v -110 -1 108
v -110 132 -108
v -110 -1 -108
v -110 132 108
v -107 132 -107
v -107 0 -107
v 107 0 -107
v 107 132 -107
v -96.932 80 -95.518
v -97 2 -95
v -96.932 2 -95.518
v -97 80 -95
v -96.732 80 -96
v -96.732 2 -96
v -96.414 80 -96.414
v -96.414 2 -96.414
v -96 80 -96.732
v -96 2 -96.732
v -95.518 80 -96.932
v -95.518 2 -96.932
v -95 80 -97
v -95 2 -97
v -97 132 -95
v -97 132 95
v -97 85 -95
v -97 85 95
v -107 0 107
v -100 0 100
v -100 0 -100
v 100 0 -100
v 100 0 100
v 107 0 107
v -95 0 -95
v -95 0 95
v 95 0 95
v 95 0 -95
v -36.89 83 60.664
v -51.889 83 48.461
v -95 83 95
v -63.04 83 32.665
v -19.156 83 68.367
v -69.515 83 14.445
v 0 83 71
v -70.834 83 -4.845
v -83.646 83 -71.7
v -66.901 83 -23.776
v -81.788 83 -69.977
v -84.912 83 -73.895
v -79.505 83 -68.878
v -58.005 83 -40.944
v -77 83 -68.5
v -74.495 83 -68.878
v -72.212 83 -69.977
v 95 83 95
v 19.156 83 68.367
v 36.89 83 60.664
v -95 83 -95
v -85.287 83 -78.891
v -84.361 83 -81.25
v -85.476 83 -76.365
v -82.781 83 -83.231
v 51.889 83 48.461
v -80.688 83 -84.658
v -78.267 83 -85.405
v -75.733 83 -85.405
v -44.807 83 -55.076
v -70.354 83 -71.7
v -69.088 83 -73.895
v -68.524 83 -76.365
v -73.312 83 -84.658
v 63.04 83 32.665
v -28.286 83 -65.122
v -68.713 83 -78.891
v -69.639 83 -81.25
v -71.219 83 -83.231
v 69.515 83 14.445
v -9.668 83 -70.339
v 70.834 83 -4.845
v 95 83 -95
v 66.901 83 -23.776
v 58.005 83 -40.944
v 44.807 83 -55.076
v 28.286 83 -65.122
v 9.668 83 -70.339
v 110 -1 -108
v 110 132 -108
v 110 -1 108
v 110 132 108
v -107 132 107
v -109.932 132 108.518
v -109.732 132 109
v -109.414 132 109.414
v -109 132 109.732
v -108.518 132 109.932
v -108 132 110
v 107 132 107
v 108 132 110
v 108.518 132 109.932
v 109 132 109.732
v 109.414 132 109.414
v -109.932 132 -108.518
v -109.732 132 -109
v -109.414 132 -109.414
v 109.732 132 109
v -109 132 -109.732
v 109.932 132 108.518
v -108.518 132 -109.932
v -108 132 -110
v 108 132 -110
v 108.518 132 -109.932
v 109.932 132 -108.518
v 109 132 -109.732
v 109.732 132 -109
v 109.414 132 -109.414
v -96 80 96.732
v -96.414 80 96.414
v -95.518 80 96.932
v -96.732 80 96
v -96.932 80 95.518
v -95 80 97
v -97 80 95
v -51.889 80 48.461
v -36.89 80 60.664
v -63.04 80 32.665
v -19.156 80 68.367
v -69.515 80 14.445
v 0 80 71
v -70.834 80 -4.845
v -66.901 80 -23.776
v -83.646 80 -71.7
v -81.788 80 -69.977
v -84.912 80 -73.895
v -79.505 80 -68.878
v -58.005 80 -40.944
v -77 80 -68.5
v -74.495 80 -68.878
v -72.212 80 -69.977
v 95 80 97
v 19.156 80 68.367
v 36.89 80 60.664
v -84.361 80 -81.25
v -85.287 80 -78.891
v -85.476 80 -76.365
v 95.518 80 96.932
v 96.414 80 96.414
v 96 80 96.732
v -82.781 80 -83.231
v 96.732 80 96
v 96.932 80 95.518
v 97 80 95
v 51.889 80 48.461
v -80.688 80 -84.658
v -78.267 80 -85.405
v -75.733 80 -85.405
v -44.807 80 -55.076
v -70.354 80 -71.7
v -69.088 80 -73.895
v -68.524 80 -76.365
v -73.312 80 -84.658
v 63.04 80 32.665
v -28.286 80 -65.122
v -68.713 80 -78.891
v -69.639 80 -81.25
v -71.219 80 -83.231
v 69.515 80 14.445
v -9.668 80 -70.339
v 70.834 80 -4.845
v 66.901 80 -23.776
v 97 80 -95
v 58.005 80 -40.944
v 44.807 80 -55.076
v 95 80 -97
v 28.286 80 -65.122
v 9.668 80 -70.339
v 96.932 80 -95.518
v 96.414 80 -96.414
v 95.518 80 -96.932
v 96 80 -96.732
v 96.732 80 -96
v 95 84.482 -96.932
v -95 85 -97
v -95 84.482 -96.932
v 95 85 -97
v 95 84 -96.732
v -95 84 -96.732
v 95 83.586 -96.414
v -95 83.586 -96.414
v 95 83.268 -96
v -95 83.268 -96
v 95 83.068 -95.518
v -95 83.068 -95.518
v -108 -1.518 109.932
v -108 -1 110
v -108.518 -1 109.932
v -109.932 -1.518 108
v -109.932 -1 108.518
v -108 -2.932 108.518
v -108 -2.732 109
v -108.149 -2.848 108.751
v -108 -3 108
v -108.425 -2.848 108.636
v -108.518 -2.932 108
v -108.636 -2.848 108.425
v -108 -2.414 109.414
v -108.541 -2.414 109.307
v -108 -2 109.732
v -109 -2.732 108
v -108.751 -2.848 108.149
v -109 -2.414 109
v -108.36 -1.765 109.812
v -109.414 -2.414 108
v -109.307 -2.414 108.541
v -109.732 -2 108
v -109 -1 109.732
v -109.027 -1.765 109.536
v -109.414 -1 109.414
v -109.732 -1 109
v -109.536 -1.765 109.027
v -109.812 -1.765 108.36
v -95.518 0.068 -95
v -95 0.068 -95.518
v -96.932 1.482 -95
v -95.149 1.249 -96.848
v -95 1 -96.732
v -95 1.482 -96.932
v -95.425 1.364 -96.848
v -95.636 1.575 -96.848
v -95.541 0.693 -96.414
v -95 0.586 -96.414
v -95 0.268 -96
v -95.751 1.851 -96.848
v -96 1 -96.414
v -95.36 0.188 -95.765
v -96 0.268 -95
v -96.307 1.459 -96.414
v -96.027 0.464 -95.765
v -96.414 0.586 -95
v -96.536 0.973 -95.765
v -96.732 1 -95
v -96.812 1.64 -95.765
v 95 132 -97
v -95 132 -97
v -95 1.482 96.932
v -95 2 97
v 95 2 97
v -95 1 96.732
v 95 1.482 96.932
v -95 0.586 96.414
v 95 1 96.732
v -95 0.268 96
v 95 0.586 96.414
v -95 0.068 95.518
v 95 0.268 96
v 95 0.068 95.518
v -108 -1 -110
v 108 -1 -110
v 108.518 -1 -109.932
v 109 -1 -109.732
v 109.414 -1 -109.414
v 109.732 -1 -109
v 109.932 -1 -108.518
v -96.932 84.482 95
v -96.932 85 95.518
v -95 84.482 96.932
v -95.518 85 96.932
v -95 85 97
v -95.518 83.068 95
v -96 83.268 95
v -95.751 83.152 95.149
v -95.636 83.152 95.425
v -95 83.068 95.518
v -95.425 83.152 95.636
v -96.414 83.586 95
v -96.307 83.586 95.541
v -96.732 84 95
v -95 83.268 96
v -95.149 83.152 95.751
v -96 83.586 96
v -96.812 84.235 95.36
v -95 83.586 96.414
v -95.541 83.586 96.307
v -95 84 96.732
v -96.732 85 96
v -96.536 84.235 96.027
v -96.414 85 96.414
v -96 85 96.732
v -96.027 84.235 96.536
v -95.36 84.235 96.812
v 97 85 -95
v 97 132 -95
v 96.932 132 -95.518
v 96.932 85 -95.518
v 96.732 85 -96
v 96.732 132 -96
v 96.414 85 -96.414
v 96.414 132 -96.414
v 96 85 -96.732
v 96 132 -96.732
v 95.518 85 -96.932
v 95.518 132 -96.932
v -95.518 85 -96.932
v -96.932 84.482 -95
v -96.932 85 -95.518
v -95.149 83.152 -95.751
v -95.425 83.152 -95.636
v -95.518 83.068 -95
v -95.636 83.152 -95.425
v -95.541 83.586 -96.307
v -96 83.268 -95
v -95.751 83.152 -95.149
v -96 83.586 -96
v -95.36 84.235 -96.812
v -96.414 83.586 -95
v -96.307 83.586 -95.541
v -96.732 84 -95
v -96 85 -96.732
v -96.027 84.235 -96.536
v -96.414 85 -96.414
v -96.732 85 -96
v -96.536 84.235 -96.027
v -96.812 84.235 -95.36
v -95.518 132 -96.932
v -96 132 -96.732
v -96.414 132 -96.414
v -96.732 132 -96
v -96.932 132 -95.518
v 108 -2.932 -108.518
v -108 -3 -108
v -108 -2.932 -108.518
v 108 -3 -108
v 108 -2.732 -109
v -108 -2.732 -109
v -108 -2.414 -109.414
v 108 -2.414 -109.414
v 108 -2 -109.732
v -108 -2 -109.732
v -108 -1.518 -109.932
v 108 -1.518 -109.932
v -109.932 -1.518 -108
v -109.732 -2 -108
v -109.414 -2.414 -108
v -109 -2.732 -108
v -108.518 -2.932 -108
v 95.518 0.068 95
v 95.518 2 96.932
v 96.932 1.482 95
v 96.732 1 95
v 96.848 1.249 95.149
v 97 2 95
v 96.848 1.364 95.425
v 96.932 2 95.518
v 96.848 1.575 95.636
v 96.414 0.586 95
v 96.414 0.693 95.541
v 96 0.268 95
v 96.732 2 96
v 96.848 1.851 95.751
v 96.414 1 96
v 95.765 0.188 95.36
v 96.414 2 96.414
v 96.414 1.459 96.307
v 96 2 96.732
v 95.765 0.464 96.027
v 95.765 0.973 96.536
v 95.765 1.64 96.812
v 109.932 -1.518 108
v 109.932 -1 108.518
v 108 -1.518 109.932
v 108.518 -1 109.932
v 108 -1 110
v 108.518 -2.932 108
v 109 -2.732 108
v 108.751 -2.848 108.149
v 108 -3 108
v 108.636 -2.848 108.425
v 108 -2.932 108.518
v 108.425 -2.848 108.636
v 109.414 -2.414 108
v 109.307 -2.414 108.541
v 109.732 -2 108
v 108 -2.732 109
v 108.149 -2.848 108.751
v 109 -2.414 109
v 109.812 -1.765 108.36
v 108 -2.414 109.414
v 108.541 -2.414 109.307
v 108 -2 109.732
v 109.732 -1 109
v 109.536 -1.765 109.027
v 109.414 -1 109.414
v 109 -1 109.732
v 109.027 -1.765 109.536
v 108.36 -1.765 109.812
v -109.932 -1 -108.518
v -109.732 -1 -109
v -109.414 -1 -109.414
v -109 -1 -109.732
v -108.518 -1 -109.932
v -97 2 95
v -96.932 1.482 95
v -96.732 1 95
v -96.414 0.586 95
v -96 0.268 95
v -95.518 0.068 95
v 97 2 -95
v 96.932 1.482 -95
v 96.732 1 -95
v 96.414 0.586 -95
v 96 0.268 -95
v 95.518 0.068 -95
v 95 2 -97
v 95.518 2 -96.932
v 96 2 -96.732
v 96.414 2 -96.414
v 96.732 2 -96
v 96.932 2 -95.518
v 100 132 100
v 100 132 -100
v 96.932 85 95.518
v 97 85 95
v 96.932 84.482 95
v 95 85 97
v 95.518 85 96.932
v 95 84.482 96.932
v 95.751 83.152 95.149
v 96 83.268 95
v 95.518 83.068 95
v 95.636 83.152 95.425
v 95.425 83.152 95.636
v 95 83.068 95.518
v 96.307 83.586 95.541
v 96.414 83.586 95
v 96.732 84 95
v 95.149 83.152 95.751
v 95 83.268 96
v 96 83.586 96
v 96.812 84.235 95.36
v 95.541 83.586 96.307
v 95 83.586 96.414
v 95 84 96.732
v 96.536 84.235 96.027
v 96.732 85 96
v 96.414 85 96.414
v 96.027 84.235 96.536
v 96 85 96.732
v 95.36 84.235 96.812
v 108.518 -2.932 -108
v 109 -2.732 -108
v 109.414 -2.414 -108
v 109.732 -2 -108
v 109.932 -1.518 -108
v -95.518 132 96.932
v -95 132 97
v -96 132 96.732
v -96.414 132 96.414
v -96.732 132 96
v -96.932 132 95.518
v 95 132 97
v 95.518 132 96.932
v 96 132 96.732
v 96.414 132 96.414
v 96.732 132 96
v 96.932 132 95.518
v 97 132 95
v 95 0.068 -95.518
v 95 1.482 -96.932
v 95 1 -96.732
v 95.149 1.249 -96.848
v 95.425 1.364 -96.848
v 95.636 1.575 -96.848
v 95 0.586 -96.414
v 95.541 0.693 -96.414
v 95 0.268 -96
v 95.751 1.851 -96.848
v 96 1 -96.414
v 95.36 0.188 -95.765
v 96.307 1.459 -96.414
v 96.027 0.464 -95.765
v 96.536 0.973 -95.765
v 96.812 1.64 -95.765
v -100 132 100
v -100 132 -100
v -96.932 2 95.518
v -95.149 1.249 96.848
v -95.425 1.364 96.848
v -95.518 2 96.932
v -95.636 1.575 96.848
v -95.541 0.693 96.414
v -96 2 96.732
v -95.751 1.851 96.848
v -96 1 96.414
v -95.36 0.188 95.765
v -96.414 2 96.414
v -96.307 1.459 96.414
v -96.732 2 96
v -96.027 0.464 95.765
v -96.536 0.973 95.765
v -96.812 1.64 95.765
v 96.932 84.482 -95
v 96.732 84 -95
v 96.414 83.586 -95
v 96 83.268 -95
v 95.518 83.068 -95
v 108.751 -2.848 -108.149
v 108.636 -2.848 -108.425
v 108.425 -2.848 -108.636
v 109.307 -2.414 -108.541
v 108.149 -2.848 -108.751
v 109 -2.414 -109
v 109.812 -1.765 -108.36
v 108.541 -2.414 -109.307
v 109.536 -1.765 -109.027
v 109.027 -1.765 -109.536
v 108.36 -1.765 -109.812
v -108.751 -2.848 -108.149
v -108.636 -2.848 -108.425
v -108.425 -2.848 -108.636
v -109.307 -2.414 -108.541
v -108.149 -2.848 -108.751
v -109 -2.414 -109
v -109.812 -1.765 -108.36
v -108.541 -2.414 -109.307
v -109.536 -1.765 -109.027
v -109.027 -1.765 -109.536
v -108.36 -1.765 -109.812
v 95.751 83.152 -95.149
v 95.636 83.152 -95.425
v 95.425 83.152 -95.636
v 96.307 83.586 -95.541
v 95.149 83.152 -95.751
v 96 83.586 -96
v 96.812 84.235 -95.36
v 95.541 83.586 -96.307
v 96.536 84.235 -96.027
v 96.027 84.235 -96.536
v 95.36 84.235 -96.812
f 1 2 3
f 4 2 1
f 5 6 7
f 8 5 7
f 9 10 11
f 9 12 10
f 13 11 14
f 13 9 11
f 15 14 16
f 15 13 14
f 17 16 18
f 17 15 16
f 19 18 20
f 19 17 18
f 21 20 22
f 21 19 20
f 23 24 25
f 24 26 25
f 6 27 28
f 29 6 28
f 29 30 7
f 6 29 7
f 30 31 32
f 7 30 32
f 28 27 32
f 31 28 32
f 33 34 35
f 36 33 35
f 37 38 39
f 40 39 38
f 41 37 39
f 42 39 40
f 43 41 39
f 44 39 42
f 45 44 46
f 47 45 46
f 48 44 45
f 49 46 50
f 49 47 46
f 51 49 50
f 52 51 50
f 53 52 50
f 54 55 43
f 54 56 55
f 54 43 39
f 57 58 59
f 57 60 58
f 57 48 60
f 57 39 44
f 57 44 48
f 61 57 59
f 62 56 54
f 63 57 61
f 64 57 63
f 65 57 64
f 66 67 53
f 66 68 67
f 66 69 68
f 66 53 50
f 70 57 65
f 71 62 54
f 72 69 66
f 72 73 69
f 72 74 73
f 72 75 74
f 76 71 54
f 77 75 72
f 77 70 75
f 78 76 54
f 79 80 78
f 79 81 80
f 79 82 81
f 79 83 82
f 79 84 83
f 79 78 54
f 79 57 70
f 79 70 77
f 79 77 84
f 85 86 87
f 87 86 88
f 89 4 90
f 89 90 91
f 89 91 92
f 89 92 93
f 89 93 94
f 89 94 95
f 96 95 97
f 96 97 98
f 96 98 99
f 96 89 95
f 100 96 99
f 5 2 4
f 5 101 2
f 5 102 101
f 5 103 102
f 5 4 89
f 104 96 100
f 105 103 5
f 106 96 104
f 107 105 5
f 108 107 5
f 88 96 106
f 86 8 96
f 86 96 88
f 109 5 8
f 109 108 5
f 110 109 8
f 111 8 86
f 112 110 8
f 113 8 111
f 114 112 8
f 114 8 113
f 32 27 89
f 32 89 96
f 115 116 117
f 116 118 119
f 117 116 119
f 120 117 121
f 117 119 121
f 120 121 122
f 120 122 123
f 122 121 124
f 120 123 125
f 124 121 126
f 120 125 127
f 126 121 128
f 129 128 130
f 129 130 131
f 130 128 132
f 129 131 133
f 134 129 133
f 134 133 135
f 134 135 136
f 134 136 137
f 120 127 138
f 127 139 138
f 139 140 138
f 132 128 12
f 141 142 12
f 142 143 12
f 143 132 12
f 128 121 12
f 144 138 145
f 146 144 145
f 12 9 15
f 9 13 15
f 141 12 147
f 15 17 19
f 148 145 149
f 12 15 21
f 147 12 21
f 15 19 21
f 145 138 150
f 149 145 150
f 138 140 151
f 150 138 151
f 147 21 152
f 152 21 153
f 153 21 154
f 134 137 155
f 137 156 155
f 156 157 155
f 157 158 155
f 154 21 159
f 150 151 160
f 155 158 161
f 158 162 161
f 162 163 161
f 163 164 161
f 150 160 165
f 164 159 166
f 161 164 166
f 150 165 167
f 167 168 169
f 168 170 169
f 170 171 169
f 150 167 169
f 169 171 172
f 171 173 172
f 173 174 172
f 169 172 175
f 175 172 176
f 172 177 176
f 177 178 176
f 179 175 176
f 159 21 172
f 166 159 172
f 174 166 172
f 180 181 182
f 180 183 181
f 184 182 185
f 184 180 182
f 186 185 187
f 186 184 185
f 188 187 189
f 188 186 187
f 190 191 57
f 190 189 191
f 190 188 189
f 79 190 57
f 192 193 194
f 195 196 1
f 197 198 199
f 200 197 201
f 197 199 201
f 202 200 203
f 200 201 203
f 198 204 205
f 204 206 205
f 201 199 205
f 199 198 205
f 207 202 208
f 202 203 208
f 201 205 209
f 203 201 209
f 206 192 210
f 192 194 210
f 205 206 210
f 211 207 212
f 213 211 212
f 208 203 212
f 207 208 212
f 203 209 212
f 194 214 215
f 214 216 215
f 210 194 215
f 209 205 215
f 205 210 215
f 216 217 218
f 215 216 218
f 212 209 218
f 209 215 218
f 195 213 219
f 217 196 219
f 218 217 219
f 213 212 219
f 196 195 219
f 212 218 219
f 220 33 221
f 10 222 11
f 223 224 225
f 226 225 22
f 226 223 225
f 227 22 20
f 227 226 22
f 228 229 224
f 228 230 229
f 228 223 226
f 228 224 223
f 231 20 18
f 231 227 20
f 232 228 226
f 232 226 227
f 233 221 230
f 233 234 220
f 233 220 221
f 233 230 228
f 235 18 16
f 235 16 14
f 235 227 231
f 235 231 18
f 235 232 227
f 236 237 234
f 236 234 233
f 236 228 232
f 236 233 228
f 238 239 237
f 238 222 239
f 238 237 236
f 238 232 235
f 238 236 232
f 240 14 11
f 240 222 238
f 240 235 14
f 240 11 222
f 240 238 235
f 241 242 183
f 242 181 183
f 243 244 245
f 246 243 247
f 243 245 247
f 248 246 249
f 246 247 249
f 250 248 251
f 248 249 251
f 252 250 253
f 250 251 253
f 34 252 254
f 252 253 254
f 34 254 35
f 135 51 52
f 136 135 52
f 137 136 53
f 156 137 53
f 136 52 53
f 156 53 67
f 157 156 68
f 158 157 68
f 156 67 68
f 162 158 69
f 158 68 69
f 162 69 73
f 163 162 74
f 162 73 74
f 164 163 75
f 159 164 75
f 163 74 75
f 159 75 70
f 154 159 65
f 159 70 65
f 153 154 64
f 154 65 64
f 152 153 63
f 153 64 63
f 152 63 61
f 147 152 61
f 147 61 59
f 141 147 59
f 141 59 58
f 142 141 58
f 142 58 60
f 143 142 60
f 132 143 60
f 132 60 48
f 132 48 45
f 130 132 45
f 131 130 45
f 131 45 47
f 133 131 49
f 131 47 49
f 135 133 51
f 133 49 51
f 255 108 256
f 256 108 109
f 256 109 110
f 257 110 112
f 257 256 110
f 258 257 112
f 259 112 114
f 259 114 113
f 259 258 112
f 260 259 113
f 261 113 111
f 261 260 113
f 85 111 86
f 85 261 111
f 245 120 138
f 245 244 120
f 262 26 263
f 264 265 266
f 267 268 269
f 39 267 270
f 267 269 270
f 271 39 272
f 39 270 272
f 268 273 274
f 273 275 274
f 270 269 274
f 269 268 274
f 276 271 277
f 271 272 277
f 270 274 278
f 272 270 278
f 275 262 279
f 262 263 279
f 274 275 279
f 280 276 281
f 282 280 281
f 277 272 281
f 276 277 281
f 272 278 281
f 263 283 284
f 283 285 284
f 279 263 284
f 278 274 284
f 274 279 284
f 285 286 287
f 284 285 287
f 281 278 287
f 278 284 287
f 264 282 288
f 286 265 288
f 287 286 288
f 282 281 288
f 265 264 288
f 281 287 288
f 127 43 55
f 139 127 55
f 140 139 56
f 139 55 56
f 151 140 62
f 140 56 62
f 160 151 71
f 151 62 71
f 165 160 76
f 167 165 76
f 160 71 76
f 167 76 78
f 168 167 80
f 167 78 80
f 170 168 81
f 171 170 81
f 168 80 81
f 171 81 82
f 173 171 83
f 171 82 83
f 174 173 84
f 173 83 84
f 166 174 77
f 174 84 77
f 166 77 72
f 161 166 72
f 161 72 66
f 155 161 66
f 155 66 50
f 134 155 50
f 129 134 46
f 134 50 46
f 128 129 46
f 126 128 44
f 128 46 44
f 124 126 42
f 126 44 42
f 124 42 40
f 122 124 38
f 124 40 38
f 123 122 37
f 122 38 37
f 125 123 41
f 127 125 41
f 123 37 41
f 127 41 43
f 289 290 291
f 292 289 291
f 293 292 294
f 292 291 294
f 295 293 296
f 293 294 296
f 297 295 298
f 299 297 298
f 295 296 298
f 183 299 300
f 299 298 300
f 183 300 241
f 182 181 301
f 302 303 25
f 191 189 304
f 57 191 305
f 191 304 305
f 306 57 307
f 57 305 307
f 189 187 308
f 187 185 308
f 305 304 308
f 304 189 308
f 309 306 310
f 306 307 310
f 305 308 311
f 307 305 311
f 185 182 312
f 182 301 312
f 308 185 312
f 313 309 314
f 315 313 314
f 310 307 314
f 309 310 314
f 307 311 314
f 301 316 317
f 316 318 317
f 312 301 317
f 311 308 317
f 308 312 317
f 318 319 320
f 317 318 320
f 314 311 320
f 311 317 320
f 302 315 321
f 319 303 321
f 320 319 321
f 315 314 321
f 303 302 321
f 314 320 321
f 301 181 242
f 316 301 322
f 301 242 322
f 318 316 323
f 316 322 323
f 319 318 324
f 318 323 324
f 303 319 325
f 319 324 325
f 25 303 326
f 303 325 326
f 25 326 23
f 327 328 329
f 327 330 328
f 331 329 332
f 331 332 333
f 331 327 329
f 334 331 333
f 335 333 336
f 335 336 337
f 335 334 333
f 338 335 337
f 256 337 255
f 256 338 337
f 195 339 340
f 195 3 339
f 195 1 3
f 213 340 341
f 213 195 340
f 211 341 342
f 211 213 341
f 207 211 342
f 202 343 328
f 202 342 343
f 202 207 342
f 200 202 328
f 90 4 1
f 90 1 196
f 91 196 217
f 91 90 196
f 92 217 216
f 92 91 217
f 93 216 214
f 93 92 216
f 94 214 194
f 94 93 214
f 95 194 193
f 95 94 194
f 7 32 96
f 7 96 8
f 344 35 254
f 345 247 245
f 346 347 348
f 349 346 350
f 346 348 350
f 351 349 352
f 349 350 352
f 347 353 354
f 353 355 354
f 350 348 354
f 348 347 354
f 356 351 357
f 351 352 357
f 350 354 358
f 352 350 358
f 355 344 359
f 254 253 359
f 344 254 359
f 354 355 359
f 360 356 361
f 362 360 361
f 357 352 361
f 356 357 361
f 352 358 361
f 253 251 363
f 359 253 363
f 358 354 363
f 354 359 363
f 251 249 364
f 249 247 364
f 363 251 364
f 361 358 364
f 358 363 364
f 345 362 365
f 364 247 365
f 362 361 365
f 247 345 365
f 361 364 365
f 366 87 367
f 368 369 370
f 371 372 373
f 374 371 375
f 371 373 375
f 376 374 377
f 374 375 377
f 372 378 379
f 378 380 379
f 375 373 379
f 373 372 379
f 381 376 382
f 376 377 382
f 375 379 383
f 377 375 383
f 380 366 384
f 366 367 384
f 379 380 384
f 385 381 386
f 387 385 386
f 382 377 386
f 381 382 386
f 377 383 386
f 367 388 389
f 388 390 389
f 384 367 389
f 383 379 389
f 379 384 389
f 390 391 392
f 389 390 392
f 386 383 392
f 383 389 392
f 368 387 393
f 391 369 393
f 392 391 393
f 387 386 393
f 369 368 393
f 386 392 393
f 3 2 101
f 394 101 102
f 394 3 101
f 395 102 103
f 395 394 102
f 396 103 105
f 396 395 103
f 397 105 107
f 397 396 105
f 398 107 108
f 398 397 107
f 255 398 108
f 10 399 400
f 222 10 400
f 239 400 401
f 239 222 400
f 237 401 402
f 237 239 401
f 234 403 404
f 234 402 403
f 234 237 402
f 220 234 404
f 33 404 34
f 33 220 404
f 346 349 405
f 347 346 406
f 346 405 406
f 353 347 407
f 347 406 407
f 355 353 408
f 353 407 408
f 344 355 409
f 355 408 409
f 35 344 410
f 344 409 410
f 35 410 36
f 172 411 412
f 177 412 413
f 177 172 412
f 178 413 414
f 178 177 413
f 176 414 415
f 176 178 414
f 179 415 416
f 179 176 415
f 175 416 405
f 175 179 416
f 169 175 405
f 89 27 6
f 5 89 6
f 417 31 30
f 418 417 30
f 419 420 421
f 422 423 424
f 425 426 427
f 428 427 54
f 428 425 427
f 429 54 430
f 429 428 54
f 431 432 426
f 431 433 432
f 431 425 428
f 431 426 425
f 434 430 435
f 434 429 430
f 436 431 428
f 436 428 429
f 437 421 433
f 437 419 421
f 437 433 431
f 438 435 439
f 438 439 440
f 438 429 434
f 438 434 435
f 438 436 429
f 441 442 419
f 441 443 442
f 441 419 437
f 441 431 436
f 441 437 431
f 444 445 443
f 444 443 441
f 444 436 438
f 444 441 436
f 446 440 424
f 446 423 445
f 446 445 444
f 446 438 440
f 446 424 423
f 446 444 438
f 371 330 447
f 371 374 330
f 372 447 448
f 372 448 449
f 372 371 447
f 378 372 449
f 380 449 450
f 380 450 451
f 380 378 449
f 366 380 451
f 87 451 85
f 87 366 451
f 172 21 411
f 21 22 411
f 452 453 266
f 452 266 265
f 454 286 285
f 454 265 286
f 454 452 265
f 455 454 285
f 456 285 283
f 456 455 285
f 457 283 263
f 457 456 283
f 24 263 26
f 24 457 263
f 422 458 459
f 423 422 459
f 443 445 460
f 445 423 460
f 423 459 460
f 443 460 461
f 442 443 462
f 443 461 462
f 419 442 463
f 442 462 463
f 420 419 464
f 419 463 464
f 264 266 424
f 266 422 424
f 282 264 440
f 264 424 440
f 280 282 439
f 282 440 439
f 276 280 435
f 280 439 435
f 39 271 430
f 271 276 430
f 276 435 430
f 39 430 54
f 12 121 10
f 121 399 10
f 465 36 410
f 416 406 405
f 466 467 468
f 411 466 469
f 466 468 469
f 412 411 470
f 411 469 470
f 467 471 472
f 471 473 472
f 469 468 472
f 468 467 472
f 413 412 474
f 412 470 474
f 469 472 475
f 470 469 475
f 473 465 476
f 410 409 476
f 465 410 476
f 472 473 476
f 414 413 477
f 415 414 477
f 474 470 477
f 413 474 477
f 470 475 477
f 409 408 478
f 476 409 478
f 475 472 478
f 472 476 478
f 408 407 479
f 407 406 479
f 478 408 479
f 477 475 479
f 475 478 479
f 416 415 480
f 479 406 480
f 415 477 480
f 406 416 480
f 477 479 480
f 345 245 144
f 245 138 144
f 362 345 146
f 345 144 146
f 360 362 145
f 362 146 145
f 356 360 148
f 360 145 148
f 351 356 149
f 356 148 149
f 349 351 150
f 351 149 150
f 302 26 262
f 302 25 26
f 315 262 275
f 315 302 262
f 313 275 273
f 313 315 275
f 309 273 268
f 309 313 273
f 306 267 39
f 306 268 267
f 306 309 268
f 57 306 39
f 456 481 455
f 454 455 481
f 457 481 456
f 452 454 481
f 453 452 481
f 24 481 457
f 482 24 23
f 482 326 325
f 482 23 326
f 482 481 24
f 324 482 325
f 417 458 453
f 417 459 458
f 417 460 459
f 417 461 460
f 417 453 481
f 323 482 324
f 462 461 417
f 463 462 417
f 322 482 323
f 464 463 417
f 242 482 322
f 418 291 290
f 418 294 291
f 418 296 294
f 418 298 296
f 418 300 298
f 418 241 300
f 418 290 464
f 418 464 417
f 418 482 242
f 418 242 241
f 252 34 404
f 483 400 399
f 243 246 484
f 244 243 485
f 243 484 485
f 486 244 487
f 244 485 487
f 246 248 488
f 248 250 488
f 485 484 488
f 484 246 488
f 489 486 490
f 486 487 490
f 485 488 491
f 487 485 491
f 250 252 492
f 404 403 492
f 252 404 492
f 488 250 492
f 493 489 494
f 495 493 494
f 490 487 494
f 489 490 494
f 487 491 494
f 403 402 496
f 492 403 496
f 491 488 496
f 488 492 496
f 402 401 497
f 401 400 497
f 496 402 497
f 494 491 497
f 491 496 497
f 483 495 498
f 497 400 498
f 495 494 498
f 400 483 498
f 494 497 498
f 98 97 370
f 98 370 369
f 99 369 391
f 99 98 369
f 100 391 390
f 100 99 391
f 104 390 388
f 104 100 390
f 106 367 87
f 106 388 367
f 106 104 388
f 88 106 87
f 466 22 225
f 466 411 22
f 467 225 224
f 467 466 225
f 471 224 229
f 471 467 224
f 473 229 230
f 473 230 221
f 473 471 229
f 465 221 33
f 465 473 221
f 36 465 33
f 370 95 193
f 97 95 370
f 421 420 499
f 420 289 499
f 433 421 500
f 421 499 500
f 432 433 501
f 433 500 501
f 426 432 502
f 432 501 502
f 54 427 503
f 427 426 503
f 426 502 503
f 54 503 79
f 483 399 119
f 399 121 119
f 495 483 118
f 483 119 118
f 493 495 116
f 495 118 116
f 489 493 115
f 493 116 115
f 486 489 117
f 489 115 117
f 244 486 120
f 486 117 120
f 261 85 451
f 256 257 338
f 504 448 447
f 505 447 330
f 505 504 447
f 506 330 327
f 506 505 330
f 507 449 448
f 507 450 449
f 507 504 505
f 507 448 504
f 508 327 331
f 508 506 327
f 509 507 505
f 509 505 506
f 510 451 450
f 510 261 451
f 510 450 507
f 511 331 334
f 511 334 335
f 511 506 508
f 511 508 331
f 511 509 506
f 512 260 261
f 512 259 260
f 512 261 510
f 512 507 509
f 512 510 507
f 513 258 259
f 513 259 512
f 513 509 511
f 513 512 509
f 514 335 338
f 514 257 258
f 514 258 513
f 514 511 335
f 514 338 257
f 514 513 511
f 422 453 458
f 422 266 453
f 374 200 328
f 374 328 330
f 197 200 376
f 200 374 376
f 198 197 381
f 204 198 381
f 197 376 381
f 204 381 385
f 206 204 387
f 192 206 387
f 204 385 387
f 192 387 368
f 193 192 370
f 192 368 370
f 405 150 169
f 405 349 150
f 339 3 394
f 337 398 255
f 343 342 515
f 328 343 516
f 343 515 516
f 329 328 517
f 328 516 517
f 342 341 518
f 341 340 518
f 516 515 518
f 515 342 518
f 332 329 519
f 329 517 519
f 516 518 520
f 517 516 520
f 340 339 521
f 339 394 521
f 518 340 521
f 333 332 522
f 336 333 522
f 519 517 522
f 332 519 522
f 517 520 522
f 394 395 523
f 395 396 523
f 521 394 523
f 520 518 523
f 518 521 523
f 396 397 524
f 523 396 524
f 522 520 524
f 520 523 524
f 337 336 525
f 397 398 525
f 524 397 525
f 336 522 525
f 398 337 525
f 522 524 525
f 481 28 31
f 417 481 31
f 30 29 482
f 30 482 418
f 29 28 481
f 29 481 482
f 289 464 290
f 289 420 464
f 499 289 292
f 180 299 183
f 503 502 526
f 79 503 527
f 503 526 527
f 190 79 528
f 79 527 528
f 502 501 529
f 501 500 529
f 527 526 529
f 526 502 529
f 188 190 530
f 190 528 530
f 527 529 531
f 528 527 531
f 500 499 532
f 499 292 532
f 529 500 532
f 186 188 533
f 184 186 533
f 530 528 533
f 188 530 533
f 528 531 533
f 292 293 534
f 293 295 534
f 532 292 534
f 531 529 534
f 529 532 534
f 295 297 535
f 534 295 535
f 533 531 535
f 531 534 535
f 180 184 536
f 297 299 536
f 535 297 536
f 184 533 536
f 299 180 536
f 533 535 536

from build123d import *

# Parameters (mm, degrees)
SKETCH1_W             = 200
SKETCH1_H             = 200
SKETCH1_W_2           = 194
SKETCH1_H_2           = 194
BOSS_EXTRUDE1_DEPTH   = 132
SKETCH1_W_3           = 220
SKETCH1_H_3           = 220
SKETCH1_W_4           = 214
SKETCH1_H_4           = 214
BOSS_EXTRUDE1_2_DEPTH = 132
SKETCH3_W             = 220
SKETCH3_H             = 220
BOSS_EXTRUDE3_DEPTH   = 3
SKETCH4_W             = 194
SKETCH4_H             = 194
BOSS_EXTRUDE4_DEPTH   = 3
SKETCH5_R             = 71
CUT_EXTRUDE1_DEPTH    = 3
SKETCH7_R             = 8.5
CUT_EXTRUDE3_DEPTH    = 3
FILLET1_R             = 2


with BuildPart() as part:
    # Sketch1 → Boss-Extrude1 (new body)
    with BuildSketch(Plane(origin=(0, 0, 0), x_dir=(1, 0, 0), z_dir=(0, 1, 0))):
        Rectangle(SKETCH1_W, SKETCH1_H)
        Rectangle(SKETCH1_W_2, SKETCH1_H_2, mode=Mode.SUBTRACT)
    extrude(amount=BOSS_EXTRUDE1_DEPTH)



with BuildPart() as body_2:
    # Sketch1 → Boss-Extrude1 2 (new body)
    with BuildSketch(Plane(origin=(0, 0, 0), x_dir=(1, 0, 0), z_dir=(0, 1, 0))):
        Rectangle(SKETCH1_W_3, SKETCH1_H_3)
        Rectangle(SKETCH1_W_4, SKETCH1_H_4, mode=Mode.SUBTRACT)
    extrude(amount=BOSS_EXTRUDE1_2_DEPTH)


with BuildPart() as part_1:
    add(part.part)

    add(body_2.part)  # Boss-Extrude3 merges body 2
    # Sketch3 → Boss-Extrude3 (add)
    with BuildSketch(Plane.XZ):
        Rectangle(SKETCH3_W, SKETCH3_H)
    extrude(amount=BOSS_EXTRUDE3_DEPTH)

    # Sketch4 → Boss-Extrude4 (add)
    with BuildSketch(Plane(origin=(0, 80, 0), x_dir=(1, 0, 0), z_dir=(0, 1, 0))):
        Rectangle(SKETCH4_W, SKETCH4_H)
    extrude(amount=BOSS_EXTRUDE4_DEPTH)

    # Sketch5 → Cut-Extrude1 (cut)
    with BuildSketch(Plane(origin=(0, 83, 0), x_dir=(1, 0, 0), z_dir=(0, 1, 0))):
        with Locations(Location((0, 0, 0), (0, 0, 270))):
            Circle(SKETCH5_R)
    extrude(amount=-CUT_EXTRUDE1_DEPTH, mode=Mode.SUBTRACT)

    # Sketch7 → Cut-Extrude3 (cut)
    with BuildSketch(Plane(origin=(0, 83, 0), x_dir=(1, 0, 0), z_dir=(0, 1, 0))):
        with Locations(Location((-77, 77, 0), (0, 0, 270))):
            Circle(SKETCH7_R)
    extrude(amount=-CUT_EXTRUDE3_DEPTH, mode=Mode.SUBTRACT)

    # Fillet1
    fillet1_edges = [part_1.edges().sort_by_distance(p)[0] for p in [
        (-97, 0, 0),
        (0, 0, 97),
        (97, 0, 0),
        (0, 0, -97),
        (-97, 107.5, -97),
        (-97, 107.5, 97),
        (97, 107.5, 97),
        (97, 107.5, -97),
        (110, 64.5, -110),
        (110, 64.5, 110),
        (-110, 64.5, 110),
        (-110, 64.5, -110),
        (110, -3, 0),
        (0, -3, 110),
        (-110, -3, 0),
        (0, -3, -110),
        (-97, 40, -97),
        (-97, 40, 97),
        (97, 40, 97),
        (97, 40, -97),
        (97, 83, 0),
        (0, 83, -97),
        (-97, 83, 0),
        (0, 83, 97),
    ]]
    fillet(fillet1_edges, radius=FILLET1_R)


solid = part_1.part
